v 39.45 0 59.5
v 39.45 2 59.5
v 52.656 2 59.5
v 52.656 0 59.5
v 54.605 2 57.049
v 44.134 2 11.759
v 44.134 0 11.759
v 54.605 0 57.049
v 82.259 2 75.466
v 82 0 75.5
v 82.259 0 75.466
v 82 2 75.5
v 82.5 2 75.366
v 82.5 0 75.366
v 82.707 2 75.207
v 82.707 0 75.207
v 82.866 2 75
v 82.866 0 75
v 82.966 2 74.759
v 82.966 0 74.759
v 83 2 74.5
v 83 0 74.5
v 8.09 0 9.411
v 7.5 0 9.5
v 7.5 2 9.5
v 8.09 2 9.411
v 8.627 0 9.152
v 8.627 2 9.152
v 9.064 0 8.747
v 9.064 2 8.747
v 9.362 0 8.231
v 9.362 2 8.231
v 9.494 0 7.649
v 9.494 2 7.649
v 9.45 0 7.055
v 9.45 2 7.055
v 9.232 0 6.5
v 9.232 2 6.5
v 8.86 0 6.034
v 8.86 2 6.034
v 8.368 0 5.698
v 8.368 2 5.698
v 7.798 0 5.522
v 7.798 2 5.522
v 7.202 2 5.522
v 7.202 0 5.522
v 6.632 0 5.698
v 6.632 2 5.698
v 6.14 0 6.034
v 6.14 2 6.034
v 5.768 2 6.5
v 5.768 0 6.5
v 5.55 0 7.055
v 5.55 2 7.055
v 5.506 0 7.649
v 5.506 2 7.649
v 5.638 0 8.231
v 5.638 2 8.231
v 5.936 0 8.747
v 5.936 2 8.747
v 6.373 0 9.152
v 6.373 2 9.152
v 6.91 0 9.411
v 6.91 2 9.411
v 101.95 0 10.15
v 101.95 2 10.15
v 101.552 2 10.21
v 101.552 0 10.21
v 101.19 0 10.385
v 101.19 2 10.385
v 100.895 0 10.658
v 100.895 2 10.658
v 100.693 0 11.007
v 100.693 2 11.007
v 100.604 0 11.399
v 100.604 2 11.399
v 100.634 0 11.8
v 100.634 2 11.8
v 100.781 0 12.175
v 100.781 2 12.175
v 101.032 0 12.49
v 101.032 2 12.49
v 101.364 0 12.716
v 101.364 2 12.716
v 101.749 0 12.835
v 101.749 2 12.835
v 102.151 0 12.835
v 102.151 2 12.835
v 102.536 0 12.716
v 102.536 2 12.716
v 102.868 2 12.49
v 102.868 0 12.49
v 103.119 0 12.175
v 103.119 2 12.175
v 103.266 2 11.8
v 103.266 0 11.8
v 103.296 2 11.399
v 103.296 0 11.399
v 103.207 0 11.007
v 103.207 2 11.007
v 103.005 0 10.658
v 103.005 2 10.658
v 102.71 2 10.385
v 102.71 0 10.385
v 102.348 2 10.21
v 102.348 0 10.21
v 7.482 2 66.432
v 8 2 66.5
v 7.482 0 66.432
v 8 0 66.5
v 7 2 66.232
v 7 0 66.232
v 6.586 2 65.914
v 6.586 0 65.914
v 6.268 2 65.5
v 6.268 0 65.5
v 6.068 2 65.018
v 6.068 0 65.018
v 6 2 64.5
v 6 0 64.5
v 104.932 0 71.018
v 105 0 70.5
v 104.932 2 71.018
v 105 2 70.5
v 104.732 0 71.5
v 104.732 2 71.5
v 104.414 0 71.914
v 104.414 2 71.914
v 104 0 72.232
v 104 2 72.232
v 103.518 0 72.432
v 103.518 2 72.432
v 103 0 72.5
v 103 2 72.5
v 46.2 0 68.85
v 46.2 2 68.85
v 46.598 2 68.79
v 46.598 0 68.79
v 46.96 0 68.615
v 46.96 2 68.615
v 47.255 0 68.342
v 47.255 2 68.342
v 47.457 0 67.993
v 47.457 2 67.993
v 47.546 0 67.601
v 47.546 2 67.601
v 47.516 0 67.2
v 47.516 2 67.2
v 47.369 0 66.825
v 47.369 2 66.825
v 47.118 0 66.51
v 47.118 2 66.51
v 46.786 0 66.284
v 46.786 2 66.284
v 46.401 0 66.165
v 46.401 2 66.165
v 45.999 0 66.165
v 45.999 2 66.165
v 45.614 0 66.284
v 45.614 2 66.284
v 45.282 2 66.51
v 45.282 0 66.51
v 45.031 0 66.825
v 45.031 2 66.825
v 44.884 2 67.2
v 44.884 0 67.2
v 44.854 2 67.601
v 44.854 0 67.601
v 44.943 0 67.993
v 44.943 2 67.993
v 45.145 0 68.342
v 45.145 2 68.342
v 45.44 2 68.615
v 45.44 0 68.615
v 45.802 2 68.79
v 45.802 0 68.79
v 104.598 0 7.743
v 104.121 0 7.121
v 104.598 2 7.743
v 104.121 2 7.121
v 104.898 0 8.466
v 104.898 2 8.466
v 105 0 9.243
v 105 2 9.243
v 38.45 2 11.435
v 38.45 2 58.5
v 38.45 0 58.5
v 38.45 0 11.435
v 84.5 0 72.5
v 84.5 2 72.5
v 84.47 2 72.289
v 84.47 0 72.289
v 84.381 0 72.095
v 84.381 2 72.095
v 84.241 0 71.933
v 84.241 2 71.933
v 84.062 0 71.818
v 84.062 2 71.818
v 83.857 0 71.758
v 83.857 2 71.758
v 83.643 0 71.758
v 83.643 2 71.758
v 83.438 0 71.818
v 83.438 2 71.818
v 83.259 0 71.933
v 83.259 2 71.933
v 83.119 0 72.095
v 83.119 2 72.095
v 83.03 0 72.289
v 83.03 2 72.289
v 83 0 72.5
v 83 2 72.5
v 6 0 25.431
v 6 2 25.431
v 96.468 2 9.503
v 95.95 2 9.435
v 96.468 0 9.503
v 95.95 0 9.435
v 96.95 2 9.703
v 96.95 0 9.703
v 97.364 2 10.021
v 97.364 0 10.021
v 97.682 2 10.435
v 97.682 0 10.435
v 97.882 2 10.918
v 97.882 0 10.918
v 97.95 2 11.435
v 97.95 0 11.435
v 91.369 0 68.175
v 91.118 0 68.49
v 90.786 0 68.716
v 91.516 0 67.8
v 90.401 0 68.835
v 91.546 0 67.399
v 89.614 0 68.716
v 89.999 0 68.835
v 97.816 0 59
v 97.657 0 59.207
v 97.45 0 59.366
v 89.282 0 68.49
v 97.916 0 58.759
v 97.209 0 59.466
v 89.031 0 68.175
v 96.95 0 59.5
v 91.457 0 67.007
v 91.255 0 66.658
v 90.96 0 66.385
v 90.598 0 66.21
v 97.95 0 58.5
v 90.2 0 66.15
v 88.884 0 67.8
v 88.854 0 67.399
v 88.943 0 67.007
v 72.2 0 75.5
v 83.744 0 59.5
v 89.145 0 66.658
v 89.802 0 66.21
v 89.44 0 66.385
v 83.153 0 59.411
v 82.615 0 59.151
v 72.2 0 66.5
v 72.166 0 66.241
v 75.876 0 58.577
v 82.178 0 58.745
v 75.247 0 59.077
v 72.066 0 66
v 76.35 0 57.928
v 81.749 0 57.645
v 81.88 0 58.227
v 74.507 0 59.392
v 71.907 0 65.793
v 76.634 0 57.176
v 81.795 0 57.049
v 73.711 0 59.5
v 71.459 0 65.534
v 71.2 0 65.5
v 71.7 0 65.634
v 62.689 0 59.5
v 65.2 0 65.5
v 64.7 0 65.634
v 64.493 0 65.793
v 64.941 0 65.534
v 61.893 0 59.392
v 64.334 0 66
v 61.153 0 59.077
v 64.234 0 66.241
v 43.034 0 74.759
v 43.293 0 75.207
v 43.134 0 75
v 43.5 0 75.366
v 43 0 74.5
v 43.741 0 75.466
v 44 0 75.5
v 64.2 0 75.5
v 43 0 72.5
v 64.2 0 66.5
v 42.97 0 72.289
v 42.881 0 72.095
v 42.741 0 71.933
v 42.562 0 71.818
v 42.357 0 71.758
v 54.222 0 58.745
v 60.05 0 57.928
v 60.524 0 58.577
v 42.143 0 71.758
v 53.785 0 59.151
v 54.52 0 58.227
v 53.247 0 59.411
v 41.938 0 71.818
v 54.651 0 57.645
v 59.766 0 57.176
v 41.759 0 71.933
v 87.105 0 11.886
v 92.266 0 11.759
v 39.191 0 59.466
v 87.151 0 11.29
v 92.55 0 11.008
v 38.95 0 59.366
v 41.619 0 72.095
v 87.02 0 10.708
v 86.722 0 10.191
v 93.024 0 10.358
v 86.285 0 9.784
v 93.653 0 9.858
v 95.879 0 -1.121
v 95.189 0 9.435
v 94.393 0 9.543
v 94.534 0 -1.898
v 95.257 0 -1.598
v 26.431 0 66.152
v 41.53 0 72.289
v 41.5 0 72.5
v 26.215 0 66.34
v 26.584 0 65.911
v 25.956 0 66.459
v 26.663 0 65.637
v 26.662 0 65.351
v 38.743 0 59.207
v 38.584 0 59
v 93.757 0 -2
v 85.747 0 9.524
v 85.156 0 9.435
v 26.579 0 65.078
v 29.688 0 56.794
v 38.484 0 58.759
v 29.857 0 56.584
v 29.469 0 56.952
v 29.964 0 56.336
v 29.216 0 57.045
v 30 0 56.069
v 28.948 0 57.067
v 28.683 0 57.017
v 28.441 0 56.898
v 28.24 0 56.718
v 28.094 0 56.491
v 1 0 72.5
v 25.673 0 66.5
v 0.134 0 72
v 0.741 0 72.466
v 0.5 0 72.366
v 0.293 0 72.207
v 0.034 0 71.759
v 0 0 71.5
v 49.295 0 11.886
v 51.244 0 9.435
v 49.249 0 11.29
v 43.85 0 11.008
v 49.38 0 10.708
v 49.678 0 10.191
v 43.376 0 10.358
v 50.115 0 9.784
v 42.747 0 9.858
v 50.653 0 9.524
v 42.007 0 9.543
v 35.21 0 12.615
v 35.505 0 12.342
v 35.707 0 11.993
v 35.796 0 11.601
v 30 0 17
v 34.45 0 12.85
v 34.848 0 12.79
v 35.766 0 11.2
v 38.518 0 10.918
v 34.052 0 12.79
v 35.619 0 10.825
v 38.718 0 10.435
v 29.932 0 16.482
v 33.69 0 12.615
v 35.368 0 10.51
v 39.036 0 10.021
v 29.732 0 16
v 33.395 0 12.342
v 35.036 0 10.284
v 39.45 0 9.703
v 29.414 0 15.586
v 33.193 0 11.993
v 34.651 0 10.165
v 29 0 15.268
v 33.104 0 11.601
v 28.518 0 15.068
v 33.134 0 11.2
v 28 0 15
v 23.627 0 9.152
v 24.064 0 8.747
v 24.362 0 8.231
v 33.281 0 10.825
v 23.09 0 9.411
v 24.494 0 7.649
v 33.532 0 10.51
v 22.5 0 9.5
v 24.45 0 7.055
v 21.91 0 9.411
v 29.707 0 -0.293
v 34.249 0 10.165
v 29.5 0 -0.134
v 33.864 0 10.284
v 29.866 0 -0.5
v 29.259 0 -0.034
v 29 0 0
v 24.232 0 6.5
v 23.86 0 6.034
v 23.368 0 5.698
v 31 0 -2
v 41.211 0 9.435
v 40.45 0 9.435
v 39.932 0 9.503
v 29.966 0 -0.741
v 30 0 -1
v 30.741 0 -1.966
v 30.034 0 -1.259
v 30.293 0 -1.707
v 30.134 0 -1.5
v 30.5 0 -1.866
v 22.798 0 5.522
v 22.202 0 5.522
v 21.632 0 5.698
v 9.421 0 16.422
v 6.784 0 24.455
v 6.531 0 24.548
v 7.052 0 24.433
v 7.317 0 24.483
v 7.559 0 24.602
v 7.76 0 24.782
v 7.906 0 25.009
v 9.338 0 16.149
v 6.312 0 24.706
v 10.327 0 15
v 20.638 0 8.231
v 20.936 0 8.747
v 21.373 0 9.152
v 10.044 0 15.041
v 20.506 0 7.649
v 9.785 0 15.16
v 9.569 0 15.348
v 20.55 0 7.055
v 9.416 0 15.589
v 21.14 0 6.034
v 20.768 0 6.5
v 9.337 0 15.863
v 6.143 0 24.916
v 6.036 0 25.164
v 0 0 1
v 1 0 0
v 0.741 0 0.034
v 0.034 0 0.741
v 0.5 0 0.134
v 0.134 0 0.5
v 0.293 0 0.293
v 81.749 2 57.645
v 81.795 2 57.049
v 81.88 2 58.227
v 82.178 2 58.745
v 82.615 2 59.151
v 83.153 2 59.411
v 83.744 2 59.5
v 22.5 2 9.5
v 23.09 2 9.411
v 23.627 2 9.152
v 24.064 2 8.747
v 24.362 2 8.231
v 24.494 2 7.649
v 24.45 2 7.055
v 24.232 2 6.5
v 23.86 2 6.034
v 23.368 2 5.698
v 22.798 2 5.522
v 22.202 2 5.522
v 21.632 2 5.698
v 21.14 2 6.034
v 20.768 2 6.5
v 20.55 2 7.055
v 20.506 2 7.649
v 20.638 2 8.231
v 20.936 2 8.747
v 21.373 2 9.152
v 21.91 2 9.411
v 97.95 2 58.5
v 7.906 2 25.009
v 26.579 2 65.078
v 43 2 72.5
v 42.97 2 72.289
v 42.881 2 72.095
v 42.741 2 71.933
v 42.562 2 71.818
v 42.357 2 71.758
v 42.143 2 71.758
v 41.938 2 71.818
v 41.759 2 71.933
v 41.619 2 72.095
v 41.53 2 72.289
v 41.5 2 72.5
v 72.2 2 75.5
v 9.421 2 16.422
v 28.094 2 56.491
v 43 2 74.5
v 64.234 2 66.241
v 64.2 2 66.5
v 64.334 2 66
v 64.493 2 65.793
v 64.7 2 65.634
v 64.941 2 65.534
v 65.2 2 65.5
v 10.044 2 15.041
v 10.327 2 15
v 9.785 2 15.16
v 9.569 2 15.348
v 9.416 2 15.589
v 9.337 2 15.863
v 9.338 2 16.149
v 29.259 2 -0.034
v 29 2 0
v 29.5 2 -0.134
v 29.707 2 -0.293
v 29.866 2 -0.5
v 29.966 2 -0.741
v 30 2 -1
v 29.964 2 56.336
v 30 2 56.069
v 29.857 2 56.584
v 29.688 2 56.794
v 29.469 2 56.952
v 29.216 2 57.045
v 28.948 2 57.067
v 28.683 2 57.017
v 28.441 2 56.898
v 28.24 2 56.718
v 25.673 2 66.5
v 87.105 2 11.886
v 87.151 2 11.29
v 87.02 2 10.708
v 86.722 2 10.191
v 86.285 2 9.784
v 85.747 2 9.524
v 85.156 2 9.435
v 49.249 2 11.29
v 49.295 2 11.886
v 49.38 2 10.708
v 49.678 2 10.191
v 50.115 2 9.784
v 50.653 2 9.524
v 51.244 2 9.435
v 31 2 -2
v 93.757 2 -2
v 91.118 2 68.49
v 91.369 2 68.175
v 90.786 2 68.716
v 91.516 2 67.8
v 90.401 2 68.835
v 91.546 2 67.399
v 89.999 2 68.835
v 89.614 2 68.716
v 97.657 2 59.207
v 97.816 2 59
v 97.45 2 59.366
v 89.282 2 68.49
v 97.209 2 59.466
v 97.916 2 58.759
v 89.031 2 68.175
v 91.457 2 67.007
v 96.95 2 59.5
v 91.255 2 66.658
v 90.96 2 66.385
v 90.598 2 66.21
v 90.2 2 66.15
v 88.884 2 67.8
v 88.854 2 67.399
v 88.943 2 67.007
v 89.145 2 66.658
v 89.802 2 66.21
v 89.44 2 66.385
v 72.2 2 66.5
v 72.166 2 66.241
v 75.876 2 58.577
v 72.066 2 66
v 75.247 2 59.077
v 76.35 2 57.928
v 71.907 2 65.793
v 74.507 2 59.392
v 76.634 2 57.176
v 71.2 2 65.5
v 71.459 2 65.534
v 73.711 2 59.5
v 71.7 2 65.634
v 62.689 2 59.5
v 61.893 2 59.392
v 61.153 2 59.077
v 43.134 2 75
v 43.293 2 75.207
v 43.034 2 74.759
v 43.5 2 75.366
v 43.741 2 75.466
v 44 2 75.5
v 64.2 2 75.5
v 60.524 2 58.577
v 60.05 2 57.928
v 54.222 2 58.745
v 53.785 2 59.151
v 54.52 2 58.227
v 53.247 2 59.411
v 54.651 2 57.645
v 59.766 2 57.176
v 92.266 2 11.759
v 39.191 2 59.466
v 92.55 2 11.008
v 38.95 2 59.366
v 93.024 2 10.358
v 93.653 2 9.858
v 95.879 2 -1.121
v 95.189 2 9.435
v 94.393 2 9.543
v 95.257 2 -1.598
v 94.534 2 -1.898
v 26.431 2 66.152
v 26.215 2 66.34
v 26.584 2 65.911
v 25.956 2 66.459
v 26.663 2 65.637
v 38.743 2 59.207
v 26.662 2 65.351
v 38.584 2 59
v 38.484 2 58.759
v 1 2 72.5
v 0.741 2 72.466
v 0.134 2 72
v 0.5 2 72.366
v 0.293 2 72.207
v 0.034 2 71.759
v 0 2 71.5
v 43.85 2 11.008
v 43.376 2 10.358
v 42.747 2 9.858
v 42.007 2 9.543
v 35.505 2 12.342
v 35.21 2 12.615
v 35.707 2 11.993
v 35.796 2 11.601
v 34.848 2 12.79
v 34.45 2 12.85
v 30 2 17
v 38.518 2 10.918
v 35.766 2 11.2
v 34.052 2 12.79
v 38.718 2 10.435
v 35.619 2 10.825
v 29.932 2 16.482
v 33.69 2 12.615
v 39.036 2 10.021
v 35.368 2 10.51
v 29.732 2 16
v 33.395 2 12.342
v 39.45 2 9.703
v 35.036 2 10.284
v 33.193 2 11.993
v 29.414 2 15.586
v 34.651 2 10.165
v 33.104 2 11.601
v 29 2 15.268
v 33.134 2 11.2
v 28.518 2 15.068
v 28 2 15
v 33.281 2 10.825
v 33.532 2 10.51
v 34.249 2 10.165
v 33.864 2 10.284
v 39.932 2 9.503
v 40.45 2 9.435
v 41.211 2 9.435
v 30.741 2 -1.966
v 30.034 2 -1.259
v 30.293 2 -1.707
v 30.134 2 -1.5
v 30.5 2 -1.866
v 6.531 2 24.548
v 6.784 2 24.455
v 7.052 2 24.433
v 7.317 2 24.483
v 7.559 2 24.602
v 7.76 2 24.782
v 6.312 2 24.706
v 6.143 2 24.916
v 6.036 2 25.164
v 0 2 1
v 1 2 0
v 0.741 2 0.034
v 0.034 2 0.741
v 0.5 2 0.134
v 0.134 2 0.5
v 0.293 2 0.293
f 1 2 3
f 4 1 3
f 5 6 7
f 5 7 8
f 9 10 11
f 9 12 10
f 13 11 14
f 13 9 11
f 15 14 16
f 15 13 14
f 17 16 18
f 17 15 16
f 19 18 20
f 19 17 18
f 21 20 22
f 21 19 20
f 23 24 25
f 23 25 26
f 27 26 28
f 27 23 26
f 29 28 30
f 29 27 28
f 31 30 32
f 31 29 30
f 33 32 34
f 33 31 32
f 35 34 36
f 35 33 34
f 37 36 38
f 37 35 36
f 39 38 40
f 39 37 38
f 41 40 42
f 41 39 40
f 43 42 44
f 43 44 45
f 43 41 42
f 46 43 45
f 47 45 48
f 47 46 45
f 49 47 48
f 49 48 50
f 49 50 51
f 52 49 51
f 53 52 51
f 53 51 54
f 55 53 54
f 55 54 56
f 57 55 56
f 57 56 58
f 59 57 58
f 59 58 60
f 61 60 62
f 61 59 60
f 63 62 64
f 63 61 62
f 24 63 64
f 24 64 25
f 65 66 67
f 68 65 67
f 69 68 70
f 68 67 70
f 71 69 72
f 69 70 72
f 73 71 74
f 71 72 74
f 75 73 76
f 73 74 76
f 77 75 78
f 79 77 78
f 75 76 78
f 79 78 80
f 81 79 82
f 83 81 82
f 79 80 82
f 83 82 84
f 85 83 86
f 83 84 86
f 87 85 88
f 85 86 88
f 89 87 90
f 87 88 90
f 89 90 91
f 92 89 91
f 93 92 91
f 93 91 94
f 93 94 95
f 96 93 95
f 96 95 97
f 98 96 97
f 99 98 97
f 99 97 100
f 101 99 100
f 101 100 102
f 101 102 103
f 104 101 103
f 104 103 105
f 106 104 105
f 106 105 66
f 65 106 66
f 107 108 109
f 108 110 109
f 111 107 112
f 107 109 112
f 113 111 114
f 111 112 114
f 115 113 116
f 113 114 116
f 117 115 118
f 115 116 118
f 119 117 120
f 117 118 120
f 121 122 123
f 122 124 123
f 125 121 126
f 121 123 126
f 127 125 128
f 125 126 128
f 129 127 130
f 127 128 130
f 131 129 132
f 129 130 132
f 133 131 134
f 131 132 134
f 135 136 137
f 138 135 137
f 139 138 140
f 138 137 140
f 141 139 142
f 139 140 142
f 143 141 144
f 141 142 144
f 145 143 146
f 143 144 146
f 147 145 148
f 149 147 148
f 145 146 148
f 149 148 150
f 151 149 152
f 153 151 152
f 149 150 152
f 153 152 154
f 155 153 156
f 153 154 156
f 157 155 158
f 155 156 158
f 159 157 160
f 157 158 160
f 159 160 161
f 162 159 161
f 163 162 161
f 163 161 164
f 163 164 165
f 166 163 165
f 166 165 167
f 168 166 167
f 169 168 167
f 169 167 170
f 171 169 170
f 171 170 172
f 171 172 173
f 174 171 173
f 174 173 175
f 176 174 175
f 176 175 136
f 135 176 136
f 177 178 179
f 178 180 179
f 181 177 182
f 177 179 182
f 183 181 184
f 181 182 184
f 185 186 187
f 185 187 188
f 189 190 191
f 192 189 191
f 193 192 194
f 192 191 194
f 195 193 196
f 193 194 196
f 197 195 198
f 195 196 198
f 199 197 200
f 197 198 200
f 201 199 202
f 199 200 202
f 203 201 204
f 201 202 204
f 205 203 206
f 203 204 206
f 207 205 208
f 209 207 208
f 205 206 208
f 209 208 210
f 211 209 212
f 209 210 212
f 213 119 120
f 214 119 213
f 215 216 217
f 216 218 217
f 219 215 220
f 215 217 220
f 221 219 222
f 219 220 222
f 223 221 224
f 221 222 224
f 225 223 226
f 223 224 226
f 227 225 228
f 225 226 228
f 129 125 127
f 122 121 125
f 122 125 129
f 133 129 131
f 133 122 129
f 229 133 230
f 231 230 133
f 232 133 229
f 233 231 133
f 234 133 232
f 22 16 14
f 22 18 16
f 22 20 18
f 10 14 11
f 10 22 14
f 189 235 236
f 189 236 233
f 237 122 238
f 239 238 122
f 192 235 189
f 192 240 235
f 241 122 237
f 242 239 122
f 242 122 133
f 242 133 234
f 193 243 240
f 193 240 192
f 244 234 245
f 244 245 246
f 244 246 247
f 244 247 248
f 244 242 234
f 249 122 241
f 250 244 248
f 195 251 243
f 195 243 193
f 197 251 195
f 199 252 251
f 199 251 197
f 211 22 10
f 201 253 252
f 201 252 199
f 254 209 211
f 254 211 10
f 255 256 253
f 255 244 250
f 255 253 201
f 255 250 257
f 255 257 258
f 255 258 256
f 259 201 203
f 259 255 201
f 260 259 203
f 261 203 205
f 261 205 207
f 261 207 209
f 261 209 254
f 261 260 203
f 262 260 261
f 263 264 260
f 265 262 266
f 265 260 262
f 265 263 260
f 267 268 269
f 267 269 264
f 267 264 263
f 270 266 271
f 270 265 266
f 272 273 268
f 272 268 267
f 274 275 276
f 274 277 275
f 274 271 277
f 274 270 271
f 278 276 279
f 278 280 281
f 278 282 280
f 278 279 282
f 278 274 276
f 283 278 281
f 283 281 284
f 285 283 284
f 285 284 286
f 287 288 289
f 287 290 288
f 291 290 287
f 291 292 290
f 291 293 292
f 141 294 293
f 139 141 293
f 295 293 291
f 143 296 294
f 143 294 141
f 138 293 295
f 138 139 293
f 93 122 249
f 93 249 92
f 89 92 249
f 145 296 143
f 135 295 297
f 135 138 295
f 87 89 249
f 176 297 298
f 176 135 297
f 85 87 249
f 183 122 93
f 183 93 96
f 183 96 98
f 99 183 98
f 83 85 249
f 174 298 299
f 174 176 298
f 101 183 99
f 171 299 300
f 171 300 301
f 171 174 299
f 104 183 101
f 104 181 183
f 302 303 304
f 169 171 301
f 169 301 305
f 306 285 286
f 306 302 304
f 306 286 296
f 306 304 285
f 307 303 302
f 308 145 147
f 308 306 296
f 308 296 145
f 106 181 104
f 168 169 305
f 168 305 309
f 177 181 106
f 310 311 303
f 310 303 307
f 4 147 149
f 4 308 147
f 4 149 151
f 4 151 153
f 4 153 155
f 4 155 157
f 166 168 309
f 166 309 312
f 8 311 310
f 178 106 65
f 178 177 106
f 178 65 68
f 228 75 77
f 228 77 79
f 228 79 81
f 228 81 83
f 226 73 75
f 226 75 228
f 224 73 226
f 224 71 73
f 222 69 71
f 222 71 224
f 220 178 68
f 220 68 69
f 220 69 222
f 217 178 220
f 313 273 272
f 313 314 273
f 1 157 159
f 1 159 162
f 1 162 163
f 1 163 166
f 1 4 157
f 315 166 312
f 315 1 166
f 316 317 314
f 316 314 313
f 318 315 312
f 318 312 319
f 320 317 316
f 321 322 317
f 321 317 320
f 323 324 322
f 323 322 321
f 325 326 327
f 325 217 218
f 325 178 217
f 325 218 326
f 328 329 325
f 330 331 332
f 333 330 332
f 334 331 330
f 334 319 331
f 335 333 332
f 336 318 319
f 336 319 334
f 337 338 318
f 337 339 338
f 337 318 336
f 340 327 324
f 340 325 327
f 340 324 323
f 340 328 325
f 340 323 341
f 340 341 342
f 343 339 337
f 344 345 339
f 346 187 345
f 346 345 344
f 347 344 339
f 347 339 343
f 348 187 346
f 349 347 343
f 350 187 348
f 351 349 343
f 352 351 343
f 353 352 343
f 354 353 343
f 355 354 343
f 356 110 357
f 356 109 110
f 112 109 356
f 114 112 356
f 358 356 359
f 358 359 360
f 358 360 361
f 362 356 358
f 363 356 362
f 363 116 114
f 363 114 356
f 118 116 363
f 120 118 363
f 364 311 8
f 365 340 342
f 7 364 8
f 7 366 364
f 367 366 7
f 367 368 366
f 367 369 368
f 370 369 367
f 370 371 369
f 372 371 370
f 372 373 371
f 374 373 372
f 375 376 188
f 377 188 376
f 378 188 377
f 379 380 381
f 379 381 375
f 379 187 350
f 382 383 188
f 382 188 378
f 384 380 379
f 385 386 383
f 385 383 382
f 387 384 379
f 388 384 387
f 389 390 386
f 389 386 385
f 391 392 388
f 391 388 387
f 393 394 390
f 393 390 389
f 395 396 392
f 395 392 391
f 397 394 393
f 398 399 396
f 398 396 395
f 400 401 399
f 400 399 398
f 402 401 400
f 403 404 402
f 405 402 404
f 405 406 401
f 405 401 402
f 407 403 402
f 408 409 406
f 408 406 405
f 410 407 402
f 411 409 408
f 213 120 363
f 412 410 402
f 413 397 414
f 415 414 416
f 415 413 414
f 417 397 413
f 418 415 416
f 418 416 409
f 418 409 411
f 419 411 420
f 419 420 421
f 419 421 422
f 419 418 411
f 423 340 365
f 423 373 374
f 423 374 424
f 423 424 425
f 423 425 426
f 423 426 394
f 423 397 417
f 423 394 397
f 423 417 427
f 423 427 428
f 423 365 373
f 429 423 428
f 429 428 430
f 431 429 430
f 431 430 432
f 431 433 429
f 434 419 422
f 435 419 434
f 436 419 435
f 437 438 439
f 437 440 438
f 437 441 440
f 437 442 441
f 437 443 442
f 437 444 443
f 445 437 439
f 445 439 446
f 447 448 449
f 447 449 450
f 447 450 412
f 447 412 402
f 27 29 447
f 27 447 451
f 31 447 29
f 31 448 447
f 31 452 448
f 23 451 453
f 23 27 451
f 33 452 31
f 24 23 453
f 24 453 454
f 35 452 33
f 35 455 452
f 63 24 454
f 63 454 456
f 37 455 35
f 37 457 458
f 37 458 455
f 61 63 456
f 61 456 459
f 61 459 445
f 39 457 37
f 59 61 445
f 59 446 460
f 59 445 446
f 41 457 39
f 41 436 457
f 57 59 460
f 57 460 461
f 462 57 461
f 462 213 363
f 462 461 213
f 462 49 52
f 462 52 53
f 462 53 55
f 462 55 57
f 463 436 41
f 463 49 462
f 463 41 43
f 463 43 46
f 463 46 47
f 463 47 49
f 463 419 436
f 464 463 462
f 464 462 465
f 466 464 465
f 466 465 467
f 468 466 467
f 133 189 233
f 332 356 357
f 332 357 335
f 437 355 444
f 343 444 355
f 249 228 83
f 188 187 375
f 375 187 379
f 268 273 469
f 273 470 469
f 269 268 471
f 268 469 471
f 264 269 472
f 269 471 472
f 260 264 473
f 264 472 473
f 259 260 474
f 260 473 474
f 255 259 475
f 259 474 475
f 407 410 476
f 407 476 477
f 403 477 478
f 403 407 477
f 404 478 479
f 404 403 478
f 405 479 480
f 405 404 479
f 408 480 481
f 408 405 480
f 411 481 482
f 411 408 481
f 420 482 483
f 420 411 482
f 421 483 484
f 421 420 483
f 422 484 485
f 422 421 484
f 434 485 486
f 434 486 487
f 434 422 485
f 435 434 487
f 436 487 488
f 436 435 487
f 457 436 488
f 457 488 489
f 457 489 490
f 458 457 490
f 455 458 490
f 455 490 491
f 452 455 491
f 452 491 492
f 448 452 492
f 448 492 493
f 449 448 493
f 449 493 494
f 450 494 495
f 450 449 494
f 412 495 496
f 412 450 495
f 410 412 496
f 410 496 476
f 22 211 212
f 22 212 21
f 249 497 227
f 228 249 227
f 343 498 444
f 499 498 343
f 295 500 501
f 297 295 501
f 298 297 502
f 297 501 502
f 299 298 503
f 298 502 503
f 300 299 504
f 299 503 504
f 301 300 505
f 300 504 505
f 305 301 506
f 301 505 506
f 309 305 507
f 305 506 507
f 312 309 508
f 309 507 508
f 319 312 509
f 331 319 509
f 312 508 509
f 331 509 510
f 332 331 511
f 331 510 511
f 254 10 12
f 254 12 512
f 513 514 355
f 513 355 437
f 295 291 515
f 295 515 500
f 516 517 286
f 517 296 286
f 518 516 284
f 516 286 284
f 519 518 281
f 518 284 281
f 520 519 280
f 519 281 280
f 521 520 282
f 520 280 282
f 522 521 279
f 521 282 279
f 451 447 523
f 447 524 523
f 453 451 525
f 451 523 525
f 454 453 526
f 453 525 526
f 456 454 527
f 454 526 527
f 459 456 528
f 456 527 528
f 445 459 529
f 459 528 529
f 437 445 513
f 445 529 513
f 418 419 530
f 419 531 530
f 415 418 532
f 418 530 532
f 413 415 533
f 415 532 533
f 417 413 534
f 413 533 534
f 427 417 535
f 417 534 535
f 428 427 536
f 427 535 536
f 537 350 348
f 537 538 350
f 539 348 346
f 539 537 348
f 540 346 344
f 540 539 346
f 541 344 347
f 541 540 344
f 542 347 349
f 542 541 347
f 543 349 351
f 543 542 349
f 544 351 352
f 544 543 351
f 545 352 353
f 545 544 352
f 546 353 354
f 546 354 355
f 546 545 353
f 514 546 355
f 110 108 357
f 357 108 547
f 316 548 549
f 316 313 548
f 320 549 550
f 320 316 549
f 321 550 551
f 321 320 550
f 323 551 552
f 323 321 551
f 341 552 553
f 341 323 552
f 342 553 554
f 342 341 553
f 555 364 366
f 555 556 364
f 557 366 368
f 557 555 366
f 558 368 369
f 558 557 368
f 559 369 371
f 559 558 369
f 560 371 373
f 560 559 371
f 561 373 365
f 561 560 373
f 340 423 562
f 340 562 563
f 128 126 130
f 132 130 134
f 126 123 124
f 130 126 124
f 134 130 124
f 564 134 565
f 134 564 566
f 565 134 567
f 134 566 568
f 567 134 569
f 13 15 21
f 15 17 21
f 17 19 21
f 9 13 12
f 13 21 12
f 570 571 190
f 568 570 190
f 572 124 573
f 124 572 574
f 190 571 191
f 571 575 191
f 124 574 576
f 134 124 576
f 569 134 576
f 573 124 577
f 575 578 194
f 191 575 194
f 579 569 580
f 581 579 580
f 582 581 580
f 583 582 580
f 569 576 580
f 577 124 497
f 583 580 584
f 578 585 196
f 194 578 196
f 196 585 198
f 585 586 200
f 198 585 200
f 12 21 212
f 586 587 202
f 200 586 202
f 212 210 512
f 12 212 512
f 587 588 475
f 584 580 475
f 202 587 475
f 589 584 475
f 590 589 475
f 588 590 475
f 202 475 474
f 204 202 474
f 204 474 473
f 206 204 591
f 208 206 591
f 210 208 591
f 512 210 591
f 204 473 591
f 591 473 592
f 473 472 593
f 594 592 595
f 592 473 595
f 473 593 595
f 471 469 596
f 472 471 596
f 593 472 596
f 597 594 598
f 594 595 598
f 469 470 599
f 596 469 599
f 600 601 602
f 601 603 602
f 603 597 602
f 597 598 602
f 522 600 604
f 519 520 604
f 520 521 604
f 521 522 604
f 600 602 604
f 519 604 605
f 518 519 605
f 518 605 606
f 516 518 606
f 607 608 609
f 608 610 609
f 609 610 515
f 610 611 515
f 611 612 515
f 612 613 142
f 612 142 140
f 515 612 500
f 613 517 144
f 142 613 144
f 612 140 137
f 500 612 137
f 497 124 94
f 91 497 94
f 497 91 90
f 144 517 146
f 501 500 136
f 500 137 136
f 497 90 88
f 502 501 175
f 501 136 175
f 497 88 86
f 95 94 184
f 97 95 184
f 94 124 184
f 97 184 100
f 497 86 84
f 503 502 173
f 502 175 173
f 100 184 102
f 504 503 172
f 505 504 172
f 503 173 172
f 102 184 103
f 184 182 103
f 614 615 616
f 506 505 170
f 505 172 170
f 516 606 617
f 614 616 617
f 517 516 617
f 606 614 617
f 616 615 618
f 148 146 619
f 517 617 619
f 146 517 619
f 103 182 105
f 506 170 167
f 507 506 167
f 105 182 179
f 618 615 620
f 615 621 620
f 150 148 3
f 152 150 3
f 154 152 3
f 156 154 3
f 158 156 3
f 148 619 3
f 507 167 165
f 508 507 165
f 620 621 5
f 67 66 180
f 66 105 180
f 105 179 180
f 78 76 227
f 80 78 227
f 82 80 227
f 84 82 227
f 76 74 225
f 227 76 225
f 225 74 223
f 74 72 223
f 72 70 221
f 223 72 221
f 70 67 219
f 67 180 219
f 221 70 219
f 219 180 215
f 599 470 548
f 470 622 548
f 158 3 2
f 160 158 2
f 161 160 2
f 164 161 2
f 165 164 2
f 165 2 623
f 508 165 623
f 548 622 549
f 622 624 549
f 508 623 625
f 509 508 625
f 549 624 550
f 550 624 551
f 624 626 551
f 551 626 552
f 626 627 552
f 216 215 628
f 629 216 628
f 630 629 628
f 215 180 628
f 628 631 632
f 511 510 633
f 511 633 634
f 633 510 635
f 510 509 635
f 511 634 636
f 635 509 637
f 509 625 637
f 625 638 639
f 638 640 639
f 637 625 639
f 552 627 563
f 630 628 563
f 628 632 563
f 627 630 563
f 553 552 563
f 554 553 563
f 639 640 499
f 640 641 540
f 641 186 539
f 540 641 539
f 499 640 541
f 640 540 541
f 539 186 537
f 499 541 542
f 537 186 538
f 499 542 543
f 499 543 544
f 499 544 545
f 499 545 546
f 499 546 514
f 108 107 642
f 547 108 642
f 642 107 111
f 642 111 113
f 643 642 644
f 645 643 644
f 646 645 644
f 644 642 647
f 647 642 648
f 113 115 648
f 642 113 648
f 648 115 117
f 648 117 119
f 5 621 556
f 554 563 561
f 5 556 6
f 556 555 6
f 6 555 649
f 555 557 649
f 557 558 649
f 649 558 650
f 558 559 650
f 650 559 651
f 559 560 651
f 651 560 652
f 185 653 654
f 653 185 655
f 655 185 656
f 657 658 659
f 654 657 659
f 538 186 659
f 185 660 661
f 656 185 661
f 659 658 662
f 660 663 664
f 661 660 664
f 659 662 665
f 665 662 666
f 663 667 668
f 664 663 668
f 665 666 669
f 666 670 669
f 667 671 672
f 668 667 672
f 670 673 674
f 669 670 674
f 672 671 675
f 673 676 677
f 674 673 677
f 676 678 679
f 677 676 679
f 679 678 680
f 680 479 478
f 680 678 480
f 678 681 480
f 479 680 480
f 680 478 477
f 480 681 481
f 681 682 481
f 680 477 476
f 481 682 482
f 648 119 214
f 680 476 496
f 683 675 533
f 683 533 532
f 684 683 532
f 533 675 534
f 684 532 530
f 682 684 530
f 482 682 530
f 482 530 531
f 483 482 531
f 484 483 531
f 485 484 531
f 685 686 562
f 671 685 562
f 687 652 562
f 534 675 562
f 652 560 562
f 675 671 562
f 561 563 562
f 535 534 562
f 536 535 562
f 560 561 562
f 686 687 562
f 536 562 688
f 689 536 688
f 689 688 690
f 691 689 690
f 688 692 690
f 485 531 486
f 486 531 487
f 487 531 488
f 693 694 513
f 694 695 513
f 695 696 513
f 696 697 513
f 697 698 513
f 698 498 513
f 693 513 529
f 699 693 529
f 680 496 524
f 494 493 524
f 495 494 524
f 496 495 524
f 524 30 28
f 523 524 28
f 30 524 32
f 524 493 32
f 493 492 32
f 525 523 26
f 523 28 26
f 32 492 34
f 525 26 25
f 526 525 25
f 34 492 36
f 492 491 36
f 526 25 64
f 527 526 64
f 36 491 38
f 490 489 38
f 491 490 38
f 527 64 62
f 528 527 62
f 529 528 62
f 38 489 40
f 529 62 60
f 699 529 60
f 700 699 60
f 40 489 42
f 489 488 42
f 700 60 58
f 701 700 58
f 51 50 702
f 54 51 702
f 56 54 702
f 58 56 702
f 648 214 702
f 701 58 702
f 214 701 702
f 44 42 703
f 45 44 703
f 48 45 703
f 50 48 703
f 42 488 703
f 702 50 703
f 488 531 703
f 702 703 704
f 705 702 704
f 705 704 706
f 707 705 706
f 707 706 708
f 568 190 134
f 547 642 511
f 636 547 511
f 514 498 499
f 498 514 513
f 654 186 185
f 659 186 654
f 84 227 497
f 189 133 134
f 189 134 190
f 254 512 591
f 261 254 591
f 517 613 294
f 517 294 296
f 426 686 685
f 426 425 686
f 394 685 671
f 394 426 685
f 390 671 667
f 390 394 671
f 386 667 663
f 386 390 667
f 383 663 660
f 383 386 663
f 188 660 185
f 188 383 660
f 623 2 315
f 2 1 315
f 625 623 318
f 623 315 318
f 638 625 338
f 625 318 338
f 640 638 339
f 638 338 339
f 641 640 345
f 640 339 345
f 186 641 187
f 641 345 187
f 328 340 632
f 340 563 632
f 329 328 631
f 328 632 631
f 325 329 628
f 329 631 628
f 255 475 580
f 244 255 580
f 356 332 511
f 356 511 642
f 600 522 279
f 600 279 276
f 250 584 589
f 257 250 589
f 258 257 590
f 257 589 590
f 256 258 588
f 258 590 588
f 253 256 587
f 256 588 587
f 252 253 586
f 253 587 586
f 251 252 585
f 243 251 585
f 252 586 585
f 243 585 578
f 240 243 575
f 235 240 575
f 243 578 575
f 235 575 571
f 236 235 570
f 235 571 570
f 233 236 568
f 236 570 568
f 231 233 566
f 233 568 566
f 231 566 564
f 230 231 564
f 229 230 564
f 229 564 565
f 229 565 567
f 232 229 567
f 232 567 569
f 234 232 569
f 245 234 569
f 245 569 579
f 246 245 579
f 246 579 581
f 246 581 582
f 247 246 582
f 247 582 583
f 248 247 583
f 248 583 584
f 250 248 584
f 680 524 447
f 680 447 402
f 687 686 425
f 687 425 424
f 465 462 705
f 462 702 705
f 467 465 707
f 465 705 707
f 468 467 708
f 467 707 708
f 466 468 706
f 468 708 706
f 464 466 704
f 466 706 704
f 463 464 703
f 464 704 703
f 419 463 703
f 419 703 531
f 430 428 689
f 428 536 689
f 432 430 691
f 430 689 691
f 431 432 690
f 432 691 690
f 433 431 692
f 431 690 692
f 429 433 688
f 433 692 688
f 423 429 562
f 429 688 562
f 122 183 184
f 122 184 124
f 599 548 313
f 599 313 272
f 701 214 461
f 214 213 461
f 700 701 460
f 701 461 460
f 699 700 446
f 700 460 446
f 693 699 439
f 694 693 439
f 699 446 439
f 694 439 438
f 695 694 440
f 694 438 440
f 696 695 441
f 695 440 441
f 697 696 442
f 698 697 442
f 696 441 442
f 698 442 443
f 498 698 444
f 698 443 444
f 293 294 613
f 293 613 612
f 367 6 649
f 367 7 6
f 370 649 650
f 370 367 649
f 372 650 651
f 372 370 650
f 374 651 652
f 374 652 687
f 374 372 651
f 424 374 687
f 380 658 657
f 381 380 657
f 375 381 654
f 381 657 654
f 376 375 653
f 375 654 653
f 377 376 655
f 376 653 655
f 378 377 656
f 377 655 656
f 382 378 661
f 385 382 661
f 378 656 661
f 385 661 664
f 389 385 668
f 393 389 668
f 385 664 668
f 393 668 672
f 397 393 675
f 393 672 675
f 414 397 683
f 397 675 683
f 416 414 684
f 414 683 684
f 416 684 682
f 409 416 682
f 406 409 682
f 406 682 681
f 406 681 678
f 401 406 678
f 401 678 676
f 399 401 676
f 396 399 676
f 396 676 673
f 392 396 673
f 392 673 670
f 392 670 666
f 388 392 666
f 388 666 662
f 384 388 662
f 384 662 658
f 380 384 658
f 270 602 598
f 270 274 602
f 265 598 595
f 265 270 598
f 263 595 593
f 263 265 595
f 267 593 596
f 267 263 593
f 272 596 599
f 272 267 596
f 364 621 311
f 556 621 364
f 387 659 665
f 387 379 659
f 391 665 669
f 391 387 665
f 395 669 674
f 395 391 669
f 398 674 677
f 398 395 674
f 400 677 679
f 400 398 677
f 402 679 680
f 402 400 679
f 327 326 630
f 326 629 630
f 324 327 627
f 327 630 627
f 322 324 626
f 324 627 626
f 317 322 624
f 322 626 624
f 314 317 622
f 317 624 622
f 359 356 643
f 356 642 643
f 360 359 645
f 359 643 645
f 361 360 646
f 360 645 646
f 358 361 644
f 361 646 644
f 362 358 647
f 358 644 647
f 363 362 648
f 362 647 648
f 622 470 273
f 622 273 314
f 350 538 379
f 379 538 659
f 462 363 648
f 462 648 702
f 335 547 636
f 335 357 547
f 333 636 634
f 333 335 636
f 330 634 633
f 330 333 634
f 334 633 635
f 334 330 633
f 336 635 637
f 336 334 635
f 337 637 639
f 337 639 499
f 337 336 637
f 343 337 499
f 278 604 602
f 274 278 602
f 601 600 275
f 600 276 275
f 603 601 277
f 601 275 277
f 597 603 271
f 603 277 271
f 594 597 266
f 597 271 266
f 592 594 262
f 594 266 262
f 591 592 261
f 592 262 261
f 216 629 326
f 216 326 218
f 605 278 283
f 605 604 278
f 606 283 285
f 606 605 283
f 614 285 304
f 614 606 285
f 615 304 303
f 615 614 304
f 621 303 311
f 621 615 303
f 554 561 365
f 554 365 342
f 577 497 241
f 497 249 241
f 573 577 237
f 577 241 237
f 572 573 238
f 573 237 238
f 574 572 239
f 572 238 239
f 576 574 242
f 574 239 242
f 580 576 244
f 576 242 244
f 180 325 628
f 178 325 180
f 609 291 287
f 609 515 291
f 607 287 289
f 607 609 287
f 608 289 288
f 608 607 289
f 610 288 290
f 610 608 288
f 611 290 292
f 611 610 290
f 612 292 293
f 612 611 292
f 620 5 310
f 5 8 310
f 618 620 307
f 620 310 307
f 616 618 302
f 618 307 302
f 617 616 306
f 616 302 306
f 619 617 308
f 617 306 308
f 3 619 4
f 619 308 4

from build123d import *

# Parameters (mm, degrees)
SKETCH_1_R          = 2
EXTRUDE_1_DEPTH     = 2
SKETCH_4_R          = 1.35
SKETCH_4_W          = 8
SKETCH_4_H          = 10
CUT_EXTRUDE_2_DEPTH = 130.341601969
SKETCH_2_R          = 0.75
SKETCH_2_W          = 24
SKETCH_2_H          = 51.5
SKETCH_2_W_2        = 59.5
SKETCH_2_H_2        = 50.064718626
CUT_EXTRUDE_1_DEPTH = 130.341601969
EXTRUDE_1_2_DEPTH   = 2
FILLET_1_R          = 1
FILLET_3_R          = 3
FILLET_2_R          = 2


with BuildPart() as part:
    # 草图1 → Extrude 1 (new body)
    with BuildSketch(Plane(origin=(0, 0, 0), x_dir=(1, 0, 0), z_dir=(0, 1, 0))):
        Polygon((0, 0), (30, 0), (30, 2), (95, 2), (105, -8), (105, -72.5), (83, -72.5), (83, -75.5), (43, -75.5), (43, -72.5), (0, -72.5), align=None)
        with Locations(Location((7.5, -7.5, 0), (0, 0, 270))):
            Circle(SKETCH_1_R, mode=Mode.SUBTRACT)
        with Locations(Location((22.5, -7.5, 0), (0, 0, 270))):
            Circle(SKETCH_1_R, mode=Mode.SUBTRACT)
    extrude(amount=EXTRUDE_1_DEPTH)

    # 草图4 → 切除-拉伸2 (cut, through all)
    with BuildSketch(Plane(origin=(0, 2, 0), x_dir=(1, 0, 0), z_dir=(0, 1, 0))):
        with Locations(Location((34.45, -11.5, 0), (0, 0, 270))):
            Circle(SKETCH_4_R)
        with Locations(Location((46.2, -67.5, 0), (0, 0, 270))):
            Circle(SKETCH_4_R)
        with Locations(Location((90.2, -67.5, 0), (0, 0, 90))):
            Circle(SKETCH_4_R)
        with Locations(Location((101.95, -11.5, 0), (0, 0, 90))):
            Circle(SKETCH_4_R)
        with Locations((68.2, -70.5)):
            Rectangle(SKETCH_4_W, SKETCH_4_H)
    extrude(amount=-CUT_EXTRUDE_2_DEPTH, mode=Mode.SUBTRACT)

    # 草图2 → 切除-拉伸1 (cut, through all)
    with BuildSketch(Plane(origin=(0, 2, 0), x_dir=(1, 0, 0), z_dir=(0, 1, 0))):
        with Locations((83.75, -72.5)):
            Circle(SKETCH_2_R)
        with Locations((42.25, -72.5)):
            Circle(SKETCH_2_R)
        with Locations((18, -40.75)):
            Rectangle(SKETCH_2_W, SKETCH_2_H)
        with Locations((68.2, -34.467640687)):
            Rectangle(SKETCH_2_W_2, SKETCH_2_H_2)
    extrude(amount=-CUT_EXTRUDE_1_DEPTH, mode=Mode.SUBTRACT)

    # 草图3 → Extrude 1 2 (add)
    with BuildSketch(Plane(origin=(0, 2, 0), x_dir=(1, 0, 0), z_dir=(0, 1, 0))):
        Polygon((3.733980422, -16.056009124), (27.733980422, -67.556009124), (32.266019578, -65.443990876), (8.266019578, -13.943990876), align=None)
        Polygon((43.264254449, -7.998436425), (55.764254449, -62.063155051), (60.635745551, -60.936844949), (48.135745551, -6.872126323), align=None)
        Polygon((88.264254449, -6.872126323), (75.764254449, -60.936844949), (80.635745551, -62.063155051), (93.135745551, -7.998436425), align=None)
    extrude(amount=-EXTRUDE_1_2_DEPTH)

    # 圆角1
    fillet_1_edges = [part.edges().sort_by_distance(p)[0] for p in [
        (27.241859665, 1, 66.5),
        (30, 1, 60.581490531),
        (8.758140335, 1, 15),
        (6, 1, 20.918509469),
        (0, 1, 0),
        (30, 1, 0),
        (30, 1, -2),
        (83, 1, 75.5),
        (43, 1, 75.5),
        (0, 1, 72.5),
        (64.2, 1, 65.5),
        (72.2, 1, 65.5),
        (38.45, 1, 59.5),
        (97.95, 1, 59.5),
    ]]
    fillet(fillet_1_edges, radius=FILLET_1_R - 0.0001)  # a hair under: the kernel refuses the full size

    # 圆角3
    fillet_3_edges = [part.edges().sort_by_distance(p)[0] for p in [
        (60.303540699, 1, 59.5),
        (43.596459301, 1, 9.435281374),
        (95, 1, -2),
        (105, 1, 8),
        (92.803540699, 1, 9.435281374),
        (76.096459301, 1, 59.5),
    ]]
    fillet(fillet_3_edges, radius=FILLET_3_R)

    # 圆角2
    fillet_2_edges = [part.edges().sort_by_distance(p)[0] for p in [
        (55.171641763, 1, 59.5),
        (48.728358237, 1, 9.435281374),
        (105, 1, 72.5),
        (81.228358237, 1, 59.5),
        (87.671641763, 1, 9.435281374),
        (6, 1, 66.5),
        (30, 1, 15),
        (38.45, 1, 9.435281374),
        (97.95, 1, 9.435281374),
    ]]
    fillet(fillet_2_edges, radius=FILLET_2_R)


solid = part.part
